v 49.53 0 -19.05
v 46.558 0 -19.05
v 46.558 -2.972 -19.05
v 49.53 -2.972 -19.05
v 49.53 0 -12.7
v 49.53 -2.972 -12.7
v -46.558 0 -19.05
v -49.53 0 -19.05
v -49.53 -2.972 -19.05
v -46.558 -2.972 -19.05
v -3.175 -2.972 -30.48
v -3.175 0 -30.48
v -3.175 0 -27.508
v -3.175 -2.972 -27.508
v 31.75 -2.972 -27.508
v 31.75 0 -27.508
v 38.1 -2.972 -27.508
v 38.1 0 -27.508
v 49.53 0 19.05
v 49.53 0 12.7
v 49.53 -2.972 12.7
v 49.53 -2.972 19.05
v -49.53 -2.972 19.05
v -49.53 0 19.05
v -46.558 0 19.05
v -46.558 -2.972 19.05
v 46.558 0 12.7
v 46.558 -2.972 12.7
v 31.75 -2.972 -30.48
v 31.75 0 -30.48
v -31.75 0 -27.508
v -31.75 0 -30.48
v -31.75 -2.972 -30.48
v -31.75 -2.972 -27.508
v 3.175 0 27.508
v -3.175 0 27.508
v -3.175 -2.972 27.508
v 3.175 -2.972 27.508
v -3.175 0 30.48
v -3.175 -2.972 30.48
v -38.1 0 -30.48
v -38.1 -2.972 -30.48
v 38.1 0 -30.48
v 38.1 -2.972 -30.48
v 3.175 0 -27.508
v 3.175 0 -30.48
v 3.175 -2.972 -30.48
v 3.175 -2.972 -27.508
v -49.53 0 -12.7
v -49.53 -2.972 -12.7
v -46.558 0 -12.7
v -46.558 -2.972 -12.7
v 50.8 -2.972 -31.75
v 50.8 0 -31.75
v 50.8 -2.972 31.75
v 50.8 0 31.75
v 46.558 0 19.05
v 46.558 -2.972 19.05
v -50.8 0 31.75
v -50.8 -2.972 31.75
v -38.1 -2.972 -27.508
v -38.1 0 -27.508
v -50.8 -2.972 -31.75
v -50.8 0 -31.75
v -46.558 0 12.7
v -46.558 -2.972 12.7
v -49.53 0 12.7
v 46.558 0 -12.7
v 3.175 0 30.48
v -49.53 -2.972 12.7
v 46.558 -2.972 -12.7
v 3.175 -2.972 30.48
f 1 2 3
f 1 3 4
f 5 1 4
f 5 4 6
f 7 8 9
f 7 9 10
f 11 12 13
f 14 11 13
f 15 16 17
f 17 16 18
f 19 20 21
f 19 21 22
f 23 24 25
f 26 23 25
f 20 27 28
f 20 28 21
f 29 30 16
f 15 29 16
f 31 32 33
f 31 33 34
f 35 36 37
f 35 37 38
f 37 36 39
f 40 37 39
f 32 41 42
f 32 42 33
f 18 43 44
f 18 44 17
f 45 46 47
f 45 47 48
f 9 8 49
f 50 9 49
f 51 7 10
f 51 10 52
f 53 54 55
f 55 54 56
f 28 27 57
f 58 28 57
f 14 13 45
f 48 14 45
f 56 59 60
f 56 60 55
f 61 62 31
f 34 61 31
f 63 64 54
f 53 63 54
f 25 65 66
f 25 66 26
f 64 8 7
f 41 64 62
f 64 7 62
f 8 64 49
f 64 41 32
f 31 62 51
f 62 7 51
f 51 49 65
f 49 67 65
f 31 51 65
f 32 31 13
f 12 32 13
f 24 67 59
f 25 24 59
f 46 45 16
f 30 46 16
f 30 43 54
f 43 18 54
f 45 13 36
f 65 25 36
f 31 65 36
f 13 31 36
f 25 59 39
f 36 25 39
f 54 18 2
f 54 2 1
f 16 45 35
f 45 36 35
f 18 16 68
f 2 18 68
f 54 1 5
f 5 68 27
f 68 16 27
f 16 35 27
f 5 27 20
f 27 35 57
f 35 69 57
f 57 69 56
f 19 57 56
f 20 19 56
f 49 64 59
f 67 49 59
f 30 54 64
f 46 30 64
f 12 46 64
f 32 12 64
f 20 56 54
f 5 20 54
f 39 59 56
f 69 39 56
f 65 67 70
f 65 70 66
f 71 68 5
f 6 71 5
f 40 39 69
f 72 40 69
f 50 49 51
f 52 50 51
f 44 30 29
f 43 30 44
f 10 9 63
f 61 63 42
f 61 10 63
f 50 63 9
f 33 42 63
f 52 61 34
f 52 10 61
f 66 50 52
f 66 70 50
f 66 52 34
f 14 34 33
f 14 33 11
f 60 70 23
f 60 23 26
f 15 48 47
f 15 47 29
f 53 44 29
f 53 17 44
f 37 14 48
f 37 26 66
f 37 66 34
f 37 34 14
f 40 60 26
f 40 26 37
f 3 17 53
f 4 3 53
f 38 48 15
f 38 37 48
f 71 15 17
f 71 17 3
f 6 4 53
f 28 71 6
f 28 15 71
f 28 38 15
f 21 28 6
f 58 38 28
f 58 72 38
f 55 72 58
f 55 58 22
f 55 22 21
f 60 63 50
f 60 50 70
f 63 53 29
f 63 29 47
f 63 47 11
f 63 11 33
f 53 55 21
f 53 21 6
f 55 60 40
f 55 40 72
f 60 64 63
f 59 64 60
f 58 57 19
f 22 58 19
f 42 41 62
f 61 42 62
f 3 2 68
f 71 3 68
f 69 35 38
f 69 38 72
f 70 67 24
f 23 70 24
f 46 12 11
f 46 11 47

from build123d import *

# Parameters (mm, degrees)
F0_W     = 101.6
F0_H     = 63.5
F0_W_2   = 6.35
F0_H_2   = 2.9718
F0_W_3   = 2.9718
F0_H_3   = 6.35
F1_DEPTH = 2.9718


with BuildPart() as f1:
    # F0 (on Front) → F1 (new body)
    with BuildSketch(Plane.XZ):
        Rectangle(F0_W, F0_H)
        with Locations((-34.925, -28.9941)):
            Rectangle(F0_W_2, F0_H_2, mode=Mode.SUBTRACT)
        with Locations((0, -28.9941)):
            Rectangle(F0_W_2, F0_H_2, mode=Mode.SUBTRACT)
        with Locations((-48.0441, -15.875)):
            Rectangle(F0_W_3, F0_H_3, mode=Mode.SUBTRACT)
        with Locations((34.925, -28.9941)):
            Rectangle(F0_W_2, F0_H_2, mode=Mode.SUBTRACT)
        with Locations((48.0441, -15.875)):
            Rectangle(F0_W_3, F0_H_3, mode=Mode.SUBTRACT)
        with Locations((-48.0441, 15.875)):
            Rectangle(F0_W_3, F0_H_3, mode=Mode.SUBTRACT)
        with Locations((0, 28.9941)):
            Rectangle(F0_W_2, F0_H_2, mode=Mode.SUBTRACT)
        with Locations((48.0441, 15.875)):
            Rectangle(F0_W_3, F0_H_3, mode=Mode.SUBTRACT)
    extrude(amount=F1_DEPTH)


solid = f1.part
